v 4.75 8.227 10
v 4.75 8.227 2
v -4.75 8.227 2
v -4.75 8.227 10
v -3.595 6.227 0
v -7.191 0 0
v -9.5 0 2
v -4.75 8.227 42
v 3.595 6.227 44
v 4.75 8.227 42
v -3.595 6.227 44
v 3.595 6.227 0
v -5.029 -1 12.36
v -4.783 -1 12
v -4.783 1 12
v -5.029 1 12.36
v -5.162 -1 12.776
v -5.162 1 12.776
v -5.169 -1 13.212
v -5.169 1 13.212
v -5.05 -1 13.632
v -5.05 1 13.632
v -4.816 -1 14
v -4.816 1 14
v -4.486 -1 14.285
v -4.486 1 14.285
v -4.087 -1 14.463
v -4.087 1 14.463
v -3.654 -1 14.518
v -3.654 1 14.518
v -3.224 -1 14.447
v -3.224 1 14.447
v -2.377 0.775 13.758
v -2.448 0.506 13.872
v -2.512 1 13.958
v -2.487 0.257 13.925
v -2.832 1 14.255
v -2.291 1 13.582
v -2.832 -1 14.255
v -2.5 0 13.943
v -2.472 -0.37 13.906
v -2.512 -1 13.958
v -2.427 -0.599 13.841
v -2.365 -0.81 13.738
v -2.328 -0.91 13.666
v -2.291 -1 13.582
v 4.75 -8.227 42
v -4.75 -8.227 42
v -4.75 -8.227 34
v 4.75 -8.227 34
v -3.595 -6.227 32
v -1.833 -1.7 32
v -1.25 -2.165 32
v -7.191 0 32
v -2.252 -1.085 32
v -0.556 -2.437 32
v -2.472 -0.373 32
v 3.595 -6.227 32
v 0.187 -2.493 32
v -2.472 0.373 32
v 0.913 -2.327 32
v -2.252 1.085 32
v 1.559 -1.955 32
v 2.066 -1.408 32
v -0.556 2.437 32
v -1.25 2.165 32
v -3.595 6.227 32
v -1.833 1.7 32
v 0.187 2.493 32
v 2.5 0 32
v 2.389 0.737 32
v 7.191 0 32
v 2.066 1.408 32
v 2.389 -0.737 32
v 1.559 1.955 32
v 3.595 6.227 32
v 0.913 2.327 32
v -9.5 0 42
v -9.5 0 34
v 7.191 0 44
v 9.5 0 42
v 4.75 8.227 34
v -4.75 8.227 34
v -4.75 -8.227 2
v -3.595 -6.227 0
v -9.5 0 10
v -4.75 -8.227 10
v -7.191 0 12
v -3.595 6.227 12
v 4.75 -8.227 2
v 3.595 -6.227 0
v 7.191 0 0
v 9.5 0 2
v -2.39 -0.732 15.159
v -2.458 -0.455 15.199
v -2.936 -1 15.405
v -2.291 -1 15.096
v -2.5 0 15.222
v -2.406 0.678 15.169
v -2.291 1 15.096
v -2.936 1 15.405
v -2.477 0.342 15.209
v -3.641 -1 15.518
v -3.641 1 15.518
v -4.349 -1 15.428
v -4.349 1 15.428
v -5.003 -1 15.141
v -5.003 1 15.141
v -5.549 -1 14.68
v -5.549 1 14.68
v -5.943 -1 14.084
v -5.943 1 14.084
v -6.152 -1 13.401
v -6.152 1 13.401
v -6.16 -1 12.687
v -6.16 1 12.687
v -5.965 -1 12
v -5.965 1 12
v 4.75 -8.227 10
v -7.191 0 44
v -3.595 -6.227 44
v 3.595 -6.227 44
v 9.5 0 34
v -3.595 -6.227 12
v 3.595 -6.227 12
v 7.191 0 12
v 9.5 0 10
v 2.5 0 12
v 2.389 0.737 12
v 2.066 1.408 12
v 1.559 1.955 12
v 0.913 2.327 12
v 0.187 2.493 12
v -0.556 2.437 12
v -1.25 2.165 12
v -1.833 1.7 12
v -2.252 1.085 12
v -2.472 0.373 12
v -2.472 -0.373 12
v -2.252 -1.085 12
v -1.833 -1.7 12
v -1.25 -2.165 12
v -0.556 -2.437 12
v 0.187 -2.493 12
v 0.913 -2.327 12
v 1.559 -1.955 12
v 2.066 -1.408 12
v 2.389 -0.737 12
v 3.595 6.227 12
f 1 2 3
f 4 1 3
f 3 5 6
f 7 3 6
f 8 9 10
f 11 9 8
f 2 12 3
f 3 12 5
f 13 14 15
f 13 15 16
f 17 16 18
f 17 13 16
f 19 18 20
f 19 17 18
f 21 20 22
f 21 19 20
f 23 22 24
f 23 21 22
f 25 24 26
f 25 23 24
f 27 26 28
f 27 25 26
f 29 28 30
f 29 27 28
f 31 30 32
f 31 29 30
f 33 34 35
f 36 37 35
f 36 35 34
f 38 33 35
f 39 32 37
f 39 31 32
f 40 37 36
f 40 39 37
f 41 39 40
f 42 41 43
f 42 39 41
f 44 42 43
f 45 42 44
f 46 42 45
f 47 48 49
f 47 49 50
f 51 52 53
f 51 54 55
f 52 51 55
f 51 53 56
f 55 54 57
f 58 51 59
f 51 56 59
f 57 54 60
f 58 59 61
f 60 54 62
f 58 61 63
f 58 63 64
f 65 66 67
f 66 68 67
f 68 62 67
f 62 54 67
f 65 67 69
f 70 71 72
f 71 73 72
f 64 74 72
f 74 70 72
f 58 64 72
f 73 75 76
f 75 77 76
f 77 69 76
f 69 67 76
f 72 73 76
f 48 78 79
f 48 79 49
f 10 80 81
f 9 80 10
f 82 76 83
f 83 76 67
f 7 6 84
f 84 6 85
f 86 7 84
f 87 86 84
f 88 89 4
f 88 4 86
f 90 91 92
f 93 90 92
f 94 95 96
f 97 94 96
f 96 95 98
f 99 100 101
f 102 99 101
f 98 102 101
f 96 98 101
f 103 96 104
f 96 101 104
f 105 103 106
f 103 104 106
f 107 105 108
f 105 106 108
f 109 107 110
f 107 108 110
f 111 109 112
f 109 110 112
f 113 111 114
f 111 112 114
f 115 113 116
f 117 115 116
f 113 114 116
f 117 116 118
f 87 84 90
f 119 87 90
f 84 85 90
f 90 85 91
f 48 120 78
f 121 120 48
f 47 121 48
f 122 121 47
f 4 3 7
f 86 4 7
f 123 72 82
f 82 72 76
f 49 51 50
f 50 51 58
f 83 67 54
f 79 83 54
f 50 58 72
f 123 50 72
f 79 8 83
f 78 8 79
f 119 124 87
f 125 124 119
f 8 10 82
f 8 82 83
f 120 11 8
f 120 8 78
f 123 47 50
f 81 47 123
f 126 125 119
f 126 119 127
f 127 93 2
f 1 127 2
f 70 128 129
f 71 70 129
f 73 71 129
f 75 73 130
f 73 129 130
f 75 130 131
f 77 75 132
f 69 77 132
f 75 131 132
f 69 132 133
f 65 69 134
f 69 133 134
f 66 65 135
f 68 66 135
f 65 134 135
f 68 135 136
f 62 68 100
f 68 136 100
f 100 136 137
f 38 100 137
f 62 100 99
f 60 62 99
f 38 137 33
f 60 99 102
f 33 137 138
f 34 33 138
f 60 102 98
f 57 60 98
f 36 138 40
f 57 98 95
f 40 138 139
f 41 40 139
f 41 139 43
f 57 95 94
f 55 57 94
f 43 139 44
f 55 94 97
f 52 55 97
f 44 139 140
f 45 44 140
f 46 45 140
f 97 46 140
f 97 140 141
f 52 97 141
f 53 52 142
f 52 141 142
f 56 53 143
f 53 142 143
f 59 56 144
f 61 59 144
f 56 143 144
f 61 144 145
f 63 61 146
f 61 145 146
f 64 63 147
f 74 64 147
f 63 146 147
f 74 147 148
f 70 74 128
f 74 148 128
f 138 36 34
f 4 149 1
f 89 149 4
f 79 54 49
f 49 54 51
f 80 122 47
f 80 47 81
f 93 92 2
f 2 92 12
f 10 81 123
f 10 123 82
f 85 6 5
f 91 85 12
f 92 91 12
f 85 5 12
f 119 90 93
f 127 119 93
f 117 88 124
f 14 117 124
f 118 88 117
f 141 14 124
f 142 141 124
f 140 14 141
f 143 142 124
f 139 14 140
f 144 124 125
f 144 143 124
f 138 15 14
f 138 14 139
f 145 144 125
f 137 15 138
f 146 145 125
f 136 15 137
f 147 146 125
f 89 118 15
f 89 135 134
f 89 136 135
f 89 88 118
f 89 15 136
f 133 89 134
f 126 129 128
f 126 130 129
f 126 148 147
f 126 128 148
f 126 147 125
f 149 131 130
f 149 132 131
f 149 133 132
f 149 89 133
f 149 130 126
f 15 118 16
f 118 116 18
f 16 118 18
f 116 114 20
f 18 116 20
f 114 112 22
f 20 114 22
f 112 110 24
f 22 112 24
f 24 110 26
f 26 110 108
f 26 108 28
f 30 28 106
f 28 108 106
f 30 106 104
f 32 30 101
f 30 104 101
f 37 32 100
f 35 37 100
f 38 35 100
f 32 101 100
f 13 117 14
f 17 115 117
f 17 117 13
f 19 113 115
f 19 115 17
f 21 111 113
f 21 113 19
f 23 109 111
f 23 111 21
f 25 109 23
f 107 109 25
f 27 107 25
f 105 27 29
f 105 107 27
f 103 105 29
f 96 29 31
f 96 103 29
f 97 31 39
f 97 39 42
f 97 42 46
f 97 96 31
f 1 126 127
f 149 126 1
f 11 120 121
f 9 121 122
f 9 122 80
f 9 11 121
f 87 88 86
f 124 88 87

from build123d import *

# Parameters (mm, degrees)
F1_DEPTH      = 12
F2_SIZE       = 2
F3_R          = 2.5
F4_DEPTH      = 10
F7_DEPTH      = 1
F7_DEPTH_BACK = 1


with BuildPart() as f1:
    # F0 (on Top) → F1 (new body)
    with BuildSketch(Plane.XY):
        Polygon((-9.5, 0), (-4.75, -8.227241), (4.75, -8.227241), (9.5, 0), (4.75, 8.227241), (-4.75, 8.227241), align=None)
    extrude(amount=F1_DEPTH)

    # F2
    f2_edges = [f1.edges().sort_by_distance(p)[0] for p in [
        (-7.125, 4.113621, 0),
        (-7.125, -4.113621, 0),
        (0, -8.227241, 0),
        (7.125, -4.113621, 0),
        (7.125, 4.113621, 0),
        (0, 8.227241, 0),
        (-7.125, 4.113621, 12),
        (-7.125, -4.113621, 12),
        (0, -8.227241, 12),
        (7.125, -4.113621, 12),
        (7.125, 4.113621, 12),
        (0, 8.227241, 12),
    ]]
    chamfer(f2_edges, length=F2_SIZE)

    # F3 (on face) → F4 (join)
    with BuildSketch(Plane.XY.offset(12)):
        Circle(F3_R)
    extrude(amount=F4_DEPTH)

    # F5: F1 across face


with BuildPart() as f1_1:
    add(f1.part)
    add(f1.part.mirror(Plane.XY.offset(22)))

    # F6 (on Front) → F7 (join, two sides)
    with BuildSketch(Plane.XZ) as f7_sk:
        with BuildLine():
            Line((-2.217598, 13.345242), (-2.217598, 15.045078))
            ThreePointArc((-2.217598, 15.045078), (-5.263964, 14.954063), (-5.958645, 11.986564))
            Line((-5.958645, 11.986564), (-4.770151, 11.986564))
            ThreePointArc((-4.770151, 11.986564), (-4.386394, 14.342682), (-2.217598, 13.345242))
        make_face()
    extrude(amount=F7_DEPTH)
    extrude(f7_sk.sketch, amount=-F7_DEPTH_BACK)


solid = f1_1.part
